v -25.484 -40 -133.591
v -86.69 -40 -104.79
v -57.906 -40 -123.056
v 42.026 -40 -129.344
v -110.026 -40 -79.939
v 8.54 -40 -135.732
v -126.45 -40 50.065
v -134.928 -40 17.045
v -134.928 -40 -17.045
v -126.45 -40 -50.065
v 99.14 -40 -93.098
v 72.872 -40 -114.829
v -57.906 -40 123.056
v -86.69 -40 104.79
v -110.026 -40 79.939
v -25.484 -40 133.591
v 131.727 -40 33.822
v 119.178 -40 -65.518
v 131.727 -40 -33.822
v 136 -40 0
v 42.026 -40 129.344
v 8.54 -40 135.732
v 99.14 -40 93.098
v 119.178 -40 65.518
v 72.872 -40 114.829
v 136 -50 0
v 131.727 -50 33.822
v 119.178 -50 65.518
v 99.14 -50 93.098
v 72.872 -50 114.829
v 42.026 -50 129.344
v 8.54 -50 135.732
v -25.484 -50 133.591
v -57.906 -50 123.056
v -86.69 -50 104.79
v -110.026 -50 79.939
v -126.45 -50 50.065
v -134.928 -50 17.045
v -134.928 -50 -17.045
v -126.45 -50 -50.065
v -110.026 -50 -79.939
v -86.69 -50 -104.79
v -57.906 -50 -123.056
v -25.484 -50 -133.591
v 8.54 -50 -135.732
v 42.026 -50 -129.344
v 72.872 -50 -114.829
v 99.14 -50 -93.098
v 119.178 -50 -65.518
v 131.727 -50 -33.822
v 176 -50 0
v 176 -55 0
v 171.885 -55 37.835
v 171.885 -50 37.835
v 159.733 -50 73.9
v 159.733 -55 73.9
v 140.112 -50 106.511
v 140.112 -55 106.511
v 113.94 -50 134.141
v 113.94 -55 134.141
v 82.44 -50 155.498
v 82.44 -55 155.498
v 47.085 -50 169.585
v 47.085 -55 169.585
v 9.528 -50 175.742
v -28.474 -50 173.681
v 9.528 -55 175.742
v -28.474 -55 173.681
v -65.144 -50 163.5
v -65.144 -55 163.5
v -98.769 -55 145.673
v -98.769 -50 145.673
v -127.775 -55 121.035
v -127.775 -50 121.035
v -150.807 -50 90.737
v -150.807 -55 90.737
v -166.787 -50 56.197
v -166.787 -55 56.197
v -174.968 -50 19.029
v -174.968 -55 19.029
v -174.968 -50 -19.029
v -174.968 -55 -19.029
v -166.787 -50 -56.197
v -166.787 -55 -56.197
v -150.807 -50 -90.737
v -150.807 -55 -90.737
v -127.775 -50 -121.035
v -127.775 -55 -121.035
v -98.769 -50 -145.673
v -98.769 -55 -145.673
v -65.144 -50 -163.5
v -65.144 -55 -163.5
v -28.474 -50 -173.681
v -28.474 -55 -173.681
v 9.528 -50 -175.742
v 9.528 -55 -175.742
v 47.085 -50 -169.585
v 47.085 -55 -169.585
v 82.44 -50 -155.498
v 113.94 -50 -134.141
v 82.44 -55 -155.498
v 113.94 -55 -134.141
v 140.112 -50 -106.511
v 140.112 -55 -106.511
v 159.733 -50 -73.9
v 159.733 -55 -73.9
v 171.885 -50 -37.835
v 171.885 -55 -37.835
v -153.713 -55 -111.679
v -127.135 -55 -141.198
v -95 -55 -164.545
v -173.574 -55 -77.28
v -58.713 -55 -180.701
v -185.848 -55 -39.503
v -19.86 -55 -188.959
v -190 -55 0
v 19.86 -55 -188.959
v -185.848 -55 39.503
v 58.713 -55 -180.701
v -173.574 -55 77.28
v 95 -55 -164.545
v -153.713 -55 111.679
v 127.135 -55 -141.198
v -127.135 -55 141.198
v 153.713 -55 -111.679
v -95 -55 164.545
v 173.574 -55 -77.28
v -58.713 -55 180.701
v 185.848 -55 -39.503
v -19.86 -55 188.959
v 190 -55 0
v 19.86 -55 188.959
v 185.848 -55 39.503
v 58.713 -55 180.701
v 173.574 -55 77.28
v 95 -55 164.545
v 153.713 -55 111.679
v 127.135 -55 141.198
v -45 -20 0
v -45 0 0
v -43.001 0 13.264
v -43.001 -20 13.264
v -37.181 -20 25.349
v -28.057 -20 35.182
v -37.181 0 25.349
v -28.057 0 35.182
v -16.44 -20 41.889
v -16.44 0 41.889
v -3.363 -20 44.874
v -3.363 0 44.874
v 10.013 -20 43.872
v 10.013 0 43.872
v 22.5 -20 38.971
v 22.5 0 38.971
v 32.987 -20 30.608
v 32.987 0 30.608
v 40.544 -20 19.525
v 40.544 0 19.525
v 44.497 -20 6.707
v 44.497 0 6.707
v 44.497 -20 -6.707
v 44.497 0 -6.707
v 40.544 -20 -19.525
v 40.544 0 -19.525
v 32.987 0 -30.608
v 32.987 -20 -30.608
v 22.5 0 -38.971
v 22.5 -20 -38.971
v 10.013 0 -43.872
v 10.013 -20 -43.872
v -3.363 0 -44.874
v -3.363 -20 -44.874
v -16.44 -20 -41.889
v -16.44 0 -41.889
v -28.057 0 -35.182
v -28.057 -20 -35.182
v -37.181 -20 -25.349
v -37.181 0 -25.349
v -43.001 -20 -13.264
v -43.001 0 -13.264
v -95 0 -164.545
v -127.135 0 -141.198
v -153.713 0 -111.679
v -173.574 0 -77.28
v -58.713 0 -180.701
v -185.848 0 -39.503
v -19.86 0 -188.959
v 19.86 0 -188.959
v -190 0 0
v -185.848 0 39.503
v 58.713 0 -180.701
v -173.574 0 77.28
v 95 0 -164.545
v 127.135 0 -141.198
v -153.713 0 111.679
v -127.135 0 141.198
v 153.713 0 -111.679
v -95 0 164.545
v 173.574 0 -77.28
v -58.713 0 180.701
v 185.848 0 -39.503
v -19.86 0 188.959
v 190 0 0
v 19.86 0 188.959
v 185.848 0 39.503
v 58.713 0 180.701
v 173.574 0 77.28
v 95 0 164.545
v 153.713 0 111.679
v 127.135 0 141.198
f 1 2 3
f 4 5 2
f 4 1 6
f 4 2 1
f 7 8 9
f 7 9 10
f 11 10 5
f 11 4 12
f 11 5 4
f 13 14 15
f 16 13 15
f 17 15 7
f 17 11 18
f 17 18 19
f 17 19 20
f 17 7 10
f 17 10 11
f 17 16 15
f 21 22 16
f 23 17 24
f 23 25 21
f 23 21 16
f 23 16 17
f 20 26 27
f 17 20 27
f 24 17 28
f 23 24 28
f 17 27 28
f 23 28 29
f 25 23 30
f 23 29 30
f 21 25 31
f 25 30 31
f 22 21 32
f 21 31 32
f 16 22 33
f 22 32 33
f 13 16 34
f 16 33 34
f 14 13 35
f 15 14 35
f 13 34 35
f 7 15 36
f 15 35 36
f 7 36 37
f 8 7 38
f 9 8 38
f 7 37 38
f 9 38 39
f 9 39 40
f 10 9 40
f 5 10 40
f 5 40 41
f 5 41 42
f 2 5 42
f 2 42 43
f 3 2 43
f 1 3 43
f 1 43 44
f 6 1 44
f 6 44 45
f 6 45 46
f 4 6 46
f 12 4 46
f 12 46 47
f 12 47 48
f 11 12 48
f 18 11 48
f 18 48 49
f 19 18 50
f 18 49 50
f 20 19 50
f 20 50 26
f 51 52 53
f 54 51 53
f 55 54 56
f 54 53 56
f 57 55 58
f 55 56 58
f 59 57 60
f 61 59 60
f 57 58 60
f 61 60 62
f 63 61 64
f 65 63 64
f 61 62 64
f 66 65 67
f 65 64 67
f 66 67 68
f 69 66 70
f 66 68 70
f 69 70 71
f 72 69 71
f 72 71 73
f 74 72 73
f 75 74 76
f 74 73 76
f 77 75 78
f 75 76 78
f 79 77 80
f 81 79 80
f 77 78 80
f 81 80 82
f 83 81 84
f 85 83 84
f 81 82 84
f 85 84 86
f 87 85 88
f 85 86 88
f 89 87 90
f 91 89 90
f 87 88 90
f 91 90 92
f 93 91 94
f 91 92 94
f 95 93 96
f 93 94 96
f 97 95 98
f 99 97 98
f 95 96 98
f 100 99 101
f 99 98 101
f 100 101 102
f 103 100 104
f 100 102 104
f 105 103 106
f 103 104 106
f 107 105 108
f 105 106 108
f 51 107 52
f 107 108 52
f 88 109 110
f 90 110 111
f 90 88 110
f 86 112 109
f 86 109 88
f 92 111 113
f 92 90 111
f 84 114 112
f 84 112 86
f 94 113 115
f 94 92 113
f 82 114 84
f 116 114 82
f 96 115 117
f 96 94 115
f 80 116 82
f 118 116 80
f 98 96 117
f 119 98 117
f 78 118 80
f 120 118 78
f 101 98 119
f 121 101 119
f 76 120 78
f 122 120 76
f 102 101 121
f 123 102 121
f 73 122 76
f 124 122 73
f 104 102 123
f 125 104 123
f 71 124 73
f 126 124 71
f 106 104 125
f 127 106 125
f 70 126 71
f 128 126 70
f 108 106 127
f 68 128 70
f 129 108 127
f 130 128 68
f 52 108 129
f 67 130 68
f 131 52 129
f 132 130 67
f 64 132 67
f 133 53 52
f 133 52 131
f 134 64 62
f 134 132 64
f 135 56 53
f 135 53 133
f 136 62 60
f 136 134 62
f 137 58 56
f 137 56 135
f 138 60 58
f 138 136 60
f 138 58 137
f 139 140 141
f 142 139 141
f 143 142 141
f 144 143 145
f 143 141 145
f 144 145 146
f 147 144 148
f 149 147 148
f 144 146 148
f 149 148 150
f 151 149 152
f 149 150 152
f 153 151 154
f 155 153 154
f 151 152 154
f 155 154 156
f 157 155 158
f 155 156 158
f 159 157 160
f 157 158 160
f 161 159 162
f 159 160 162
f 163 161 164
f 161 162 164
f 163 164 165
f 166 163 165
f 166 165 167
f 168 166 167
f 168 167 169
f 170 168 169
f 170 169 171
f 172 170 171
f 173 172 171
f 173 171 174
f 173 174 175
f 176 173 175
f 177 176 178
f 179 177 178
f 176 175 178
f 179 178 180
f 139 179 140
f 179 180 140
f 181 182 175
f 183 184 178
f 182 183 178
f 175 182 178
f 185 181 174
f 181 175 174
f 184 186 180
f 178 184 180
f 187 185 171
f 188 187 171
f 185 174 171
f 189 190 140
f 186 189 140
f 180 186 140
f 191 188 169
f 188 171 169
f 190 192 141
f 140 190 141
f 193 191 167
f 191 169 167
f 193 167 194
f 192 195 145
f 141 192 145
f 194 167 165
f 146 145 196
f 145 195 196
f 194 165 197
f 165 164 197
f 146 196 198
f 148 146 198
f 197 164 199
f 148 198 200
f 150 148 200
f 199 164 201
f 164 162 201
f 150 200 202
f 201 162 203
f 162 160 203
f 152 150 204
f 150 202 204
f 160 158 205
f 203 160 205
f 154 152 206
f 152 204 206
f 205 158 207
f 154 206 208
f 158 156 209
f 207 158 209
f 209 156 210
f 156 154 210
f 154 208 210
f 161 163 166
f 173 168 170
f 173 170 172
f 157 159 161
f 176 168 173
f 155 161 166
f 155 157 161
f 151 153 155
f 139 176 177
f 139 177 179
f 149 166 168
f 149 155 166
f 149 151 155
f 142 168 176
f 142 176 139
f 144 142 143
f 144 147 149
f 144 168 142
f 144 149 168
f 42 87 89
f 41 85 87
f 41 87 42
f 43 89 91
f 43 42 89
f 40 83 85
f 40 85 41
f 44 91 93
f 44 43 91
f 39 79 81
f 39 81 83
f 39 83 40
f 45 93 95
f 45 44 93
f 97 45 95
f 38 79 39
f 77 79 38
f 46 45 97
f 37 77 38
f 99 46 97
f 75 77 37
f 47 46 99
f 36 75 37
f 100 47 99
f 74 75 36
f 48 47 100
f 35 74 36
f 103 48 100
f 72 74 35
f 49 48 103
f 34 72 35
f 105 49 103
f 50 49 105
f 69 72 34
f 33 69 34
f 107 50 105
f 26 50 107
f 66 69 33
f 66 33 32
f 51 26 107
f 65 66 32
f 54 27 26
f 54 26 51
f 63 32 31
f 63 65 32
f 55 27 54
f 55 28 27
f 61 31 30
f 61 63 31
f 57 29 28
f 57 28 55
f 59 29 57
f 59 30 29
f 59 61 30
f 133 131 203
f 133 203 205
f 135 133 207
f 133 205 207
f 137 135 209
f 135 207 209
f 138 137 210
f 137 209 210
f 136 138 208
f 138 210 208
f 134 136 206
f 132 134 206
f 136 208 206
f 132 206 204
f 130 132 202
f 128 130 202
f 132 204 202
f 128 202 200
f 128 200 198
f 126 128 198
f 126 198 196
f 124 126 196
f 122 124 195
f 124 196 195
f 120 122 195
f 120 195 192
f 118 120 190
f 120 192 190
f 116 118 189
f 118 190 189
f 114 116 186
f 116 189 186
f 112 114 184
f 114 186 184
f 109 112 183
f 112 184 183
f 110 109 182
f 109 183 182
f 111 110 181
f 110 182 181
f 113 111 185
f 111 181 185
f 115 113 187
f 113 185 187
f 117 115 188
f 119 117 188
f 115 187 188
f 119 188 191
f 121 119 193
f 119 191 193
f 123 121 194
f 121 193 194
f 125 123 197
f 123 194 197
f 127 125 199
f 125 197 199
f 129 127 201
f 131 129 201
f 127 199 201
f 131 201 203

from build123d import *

# Parameters (mm, degrees)
F0_R      = 190
F1_DEPTH  = 55
F2_R      = 45
F3_DEPTH  = 20
F4_R      = 176
F4_R_2    = 136
F5_DEPTH  = 5
F5_FACE_R = 136
F6_DEPTH  = 15


with BuildPart() as f1:
    # F0 (on Front) → F1 (new body)
    with BuildSketch(Plane.XZ):
        Circle(F0_R)
    extrude(amount=F1_DEPTH)

    # F2 (on face) → F3 (cut)
    with BuildSketch(Plane(origin=(0, 0, 0), x_dir=(-1, 0, 0), z_dir=(0, 1, 0))):
        Circle(F2_R)
    extrude(amount=-F3_DEPTH, mode=Mode.SUBTRACT)

    # F4 (on face) → F5 (cut)
    with BuildSketch(Plane.XZ.offset(55)):
        Circle(F4_R)
        Circle(F4_R_2, mode=Mode.SUBTRACT)
    extrude(amount=-F5_DEPTH, mode=Mode.SUBTRACT)

    # F5_face (on face) → F6 (cut)
    with BuildSketch(Plane.XZ.offset(55)):
        Circle(F5_FACE_R)
    extrude(amount=-F6_DEPTH, mode=Mode.SUBTRACT)


solid = f1.part
